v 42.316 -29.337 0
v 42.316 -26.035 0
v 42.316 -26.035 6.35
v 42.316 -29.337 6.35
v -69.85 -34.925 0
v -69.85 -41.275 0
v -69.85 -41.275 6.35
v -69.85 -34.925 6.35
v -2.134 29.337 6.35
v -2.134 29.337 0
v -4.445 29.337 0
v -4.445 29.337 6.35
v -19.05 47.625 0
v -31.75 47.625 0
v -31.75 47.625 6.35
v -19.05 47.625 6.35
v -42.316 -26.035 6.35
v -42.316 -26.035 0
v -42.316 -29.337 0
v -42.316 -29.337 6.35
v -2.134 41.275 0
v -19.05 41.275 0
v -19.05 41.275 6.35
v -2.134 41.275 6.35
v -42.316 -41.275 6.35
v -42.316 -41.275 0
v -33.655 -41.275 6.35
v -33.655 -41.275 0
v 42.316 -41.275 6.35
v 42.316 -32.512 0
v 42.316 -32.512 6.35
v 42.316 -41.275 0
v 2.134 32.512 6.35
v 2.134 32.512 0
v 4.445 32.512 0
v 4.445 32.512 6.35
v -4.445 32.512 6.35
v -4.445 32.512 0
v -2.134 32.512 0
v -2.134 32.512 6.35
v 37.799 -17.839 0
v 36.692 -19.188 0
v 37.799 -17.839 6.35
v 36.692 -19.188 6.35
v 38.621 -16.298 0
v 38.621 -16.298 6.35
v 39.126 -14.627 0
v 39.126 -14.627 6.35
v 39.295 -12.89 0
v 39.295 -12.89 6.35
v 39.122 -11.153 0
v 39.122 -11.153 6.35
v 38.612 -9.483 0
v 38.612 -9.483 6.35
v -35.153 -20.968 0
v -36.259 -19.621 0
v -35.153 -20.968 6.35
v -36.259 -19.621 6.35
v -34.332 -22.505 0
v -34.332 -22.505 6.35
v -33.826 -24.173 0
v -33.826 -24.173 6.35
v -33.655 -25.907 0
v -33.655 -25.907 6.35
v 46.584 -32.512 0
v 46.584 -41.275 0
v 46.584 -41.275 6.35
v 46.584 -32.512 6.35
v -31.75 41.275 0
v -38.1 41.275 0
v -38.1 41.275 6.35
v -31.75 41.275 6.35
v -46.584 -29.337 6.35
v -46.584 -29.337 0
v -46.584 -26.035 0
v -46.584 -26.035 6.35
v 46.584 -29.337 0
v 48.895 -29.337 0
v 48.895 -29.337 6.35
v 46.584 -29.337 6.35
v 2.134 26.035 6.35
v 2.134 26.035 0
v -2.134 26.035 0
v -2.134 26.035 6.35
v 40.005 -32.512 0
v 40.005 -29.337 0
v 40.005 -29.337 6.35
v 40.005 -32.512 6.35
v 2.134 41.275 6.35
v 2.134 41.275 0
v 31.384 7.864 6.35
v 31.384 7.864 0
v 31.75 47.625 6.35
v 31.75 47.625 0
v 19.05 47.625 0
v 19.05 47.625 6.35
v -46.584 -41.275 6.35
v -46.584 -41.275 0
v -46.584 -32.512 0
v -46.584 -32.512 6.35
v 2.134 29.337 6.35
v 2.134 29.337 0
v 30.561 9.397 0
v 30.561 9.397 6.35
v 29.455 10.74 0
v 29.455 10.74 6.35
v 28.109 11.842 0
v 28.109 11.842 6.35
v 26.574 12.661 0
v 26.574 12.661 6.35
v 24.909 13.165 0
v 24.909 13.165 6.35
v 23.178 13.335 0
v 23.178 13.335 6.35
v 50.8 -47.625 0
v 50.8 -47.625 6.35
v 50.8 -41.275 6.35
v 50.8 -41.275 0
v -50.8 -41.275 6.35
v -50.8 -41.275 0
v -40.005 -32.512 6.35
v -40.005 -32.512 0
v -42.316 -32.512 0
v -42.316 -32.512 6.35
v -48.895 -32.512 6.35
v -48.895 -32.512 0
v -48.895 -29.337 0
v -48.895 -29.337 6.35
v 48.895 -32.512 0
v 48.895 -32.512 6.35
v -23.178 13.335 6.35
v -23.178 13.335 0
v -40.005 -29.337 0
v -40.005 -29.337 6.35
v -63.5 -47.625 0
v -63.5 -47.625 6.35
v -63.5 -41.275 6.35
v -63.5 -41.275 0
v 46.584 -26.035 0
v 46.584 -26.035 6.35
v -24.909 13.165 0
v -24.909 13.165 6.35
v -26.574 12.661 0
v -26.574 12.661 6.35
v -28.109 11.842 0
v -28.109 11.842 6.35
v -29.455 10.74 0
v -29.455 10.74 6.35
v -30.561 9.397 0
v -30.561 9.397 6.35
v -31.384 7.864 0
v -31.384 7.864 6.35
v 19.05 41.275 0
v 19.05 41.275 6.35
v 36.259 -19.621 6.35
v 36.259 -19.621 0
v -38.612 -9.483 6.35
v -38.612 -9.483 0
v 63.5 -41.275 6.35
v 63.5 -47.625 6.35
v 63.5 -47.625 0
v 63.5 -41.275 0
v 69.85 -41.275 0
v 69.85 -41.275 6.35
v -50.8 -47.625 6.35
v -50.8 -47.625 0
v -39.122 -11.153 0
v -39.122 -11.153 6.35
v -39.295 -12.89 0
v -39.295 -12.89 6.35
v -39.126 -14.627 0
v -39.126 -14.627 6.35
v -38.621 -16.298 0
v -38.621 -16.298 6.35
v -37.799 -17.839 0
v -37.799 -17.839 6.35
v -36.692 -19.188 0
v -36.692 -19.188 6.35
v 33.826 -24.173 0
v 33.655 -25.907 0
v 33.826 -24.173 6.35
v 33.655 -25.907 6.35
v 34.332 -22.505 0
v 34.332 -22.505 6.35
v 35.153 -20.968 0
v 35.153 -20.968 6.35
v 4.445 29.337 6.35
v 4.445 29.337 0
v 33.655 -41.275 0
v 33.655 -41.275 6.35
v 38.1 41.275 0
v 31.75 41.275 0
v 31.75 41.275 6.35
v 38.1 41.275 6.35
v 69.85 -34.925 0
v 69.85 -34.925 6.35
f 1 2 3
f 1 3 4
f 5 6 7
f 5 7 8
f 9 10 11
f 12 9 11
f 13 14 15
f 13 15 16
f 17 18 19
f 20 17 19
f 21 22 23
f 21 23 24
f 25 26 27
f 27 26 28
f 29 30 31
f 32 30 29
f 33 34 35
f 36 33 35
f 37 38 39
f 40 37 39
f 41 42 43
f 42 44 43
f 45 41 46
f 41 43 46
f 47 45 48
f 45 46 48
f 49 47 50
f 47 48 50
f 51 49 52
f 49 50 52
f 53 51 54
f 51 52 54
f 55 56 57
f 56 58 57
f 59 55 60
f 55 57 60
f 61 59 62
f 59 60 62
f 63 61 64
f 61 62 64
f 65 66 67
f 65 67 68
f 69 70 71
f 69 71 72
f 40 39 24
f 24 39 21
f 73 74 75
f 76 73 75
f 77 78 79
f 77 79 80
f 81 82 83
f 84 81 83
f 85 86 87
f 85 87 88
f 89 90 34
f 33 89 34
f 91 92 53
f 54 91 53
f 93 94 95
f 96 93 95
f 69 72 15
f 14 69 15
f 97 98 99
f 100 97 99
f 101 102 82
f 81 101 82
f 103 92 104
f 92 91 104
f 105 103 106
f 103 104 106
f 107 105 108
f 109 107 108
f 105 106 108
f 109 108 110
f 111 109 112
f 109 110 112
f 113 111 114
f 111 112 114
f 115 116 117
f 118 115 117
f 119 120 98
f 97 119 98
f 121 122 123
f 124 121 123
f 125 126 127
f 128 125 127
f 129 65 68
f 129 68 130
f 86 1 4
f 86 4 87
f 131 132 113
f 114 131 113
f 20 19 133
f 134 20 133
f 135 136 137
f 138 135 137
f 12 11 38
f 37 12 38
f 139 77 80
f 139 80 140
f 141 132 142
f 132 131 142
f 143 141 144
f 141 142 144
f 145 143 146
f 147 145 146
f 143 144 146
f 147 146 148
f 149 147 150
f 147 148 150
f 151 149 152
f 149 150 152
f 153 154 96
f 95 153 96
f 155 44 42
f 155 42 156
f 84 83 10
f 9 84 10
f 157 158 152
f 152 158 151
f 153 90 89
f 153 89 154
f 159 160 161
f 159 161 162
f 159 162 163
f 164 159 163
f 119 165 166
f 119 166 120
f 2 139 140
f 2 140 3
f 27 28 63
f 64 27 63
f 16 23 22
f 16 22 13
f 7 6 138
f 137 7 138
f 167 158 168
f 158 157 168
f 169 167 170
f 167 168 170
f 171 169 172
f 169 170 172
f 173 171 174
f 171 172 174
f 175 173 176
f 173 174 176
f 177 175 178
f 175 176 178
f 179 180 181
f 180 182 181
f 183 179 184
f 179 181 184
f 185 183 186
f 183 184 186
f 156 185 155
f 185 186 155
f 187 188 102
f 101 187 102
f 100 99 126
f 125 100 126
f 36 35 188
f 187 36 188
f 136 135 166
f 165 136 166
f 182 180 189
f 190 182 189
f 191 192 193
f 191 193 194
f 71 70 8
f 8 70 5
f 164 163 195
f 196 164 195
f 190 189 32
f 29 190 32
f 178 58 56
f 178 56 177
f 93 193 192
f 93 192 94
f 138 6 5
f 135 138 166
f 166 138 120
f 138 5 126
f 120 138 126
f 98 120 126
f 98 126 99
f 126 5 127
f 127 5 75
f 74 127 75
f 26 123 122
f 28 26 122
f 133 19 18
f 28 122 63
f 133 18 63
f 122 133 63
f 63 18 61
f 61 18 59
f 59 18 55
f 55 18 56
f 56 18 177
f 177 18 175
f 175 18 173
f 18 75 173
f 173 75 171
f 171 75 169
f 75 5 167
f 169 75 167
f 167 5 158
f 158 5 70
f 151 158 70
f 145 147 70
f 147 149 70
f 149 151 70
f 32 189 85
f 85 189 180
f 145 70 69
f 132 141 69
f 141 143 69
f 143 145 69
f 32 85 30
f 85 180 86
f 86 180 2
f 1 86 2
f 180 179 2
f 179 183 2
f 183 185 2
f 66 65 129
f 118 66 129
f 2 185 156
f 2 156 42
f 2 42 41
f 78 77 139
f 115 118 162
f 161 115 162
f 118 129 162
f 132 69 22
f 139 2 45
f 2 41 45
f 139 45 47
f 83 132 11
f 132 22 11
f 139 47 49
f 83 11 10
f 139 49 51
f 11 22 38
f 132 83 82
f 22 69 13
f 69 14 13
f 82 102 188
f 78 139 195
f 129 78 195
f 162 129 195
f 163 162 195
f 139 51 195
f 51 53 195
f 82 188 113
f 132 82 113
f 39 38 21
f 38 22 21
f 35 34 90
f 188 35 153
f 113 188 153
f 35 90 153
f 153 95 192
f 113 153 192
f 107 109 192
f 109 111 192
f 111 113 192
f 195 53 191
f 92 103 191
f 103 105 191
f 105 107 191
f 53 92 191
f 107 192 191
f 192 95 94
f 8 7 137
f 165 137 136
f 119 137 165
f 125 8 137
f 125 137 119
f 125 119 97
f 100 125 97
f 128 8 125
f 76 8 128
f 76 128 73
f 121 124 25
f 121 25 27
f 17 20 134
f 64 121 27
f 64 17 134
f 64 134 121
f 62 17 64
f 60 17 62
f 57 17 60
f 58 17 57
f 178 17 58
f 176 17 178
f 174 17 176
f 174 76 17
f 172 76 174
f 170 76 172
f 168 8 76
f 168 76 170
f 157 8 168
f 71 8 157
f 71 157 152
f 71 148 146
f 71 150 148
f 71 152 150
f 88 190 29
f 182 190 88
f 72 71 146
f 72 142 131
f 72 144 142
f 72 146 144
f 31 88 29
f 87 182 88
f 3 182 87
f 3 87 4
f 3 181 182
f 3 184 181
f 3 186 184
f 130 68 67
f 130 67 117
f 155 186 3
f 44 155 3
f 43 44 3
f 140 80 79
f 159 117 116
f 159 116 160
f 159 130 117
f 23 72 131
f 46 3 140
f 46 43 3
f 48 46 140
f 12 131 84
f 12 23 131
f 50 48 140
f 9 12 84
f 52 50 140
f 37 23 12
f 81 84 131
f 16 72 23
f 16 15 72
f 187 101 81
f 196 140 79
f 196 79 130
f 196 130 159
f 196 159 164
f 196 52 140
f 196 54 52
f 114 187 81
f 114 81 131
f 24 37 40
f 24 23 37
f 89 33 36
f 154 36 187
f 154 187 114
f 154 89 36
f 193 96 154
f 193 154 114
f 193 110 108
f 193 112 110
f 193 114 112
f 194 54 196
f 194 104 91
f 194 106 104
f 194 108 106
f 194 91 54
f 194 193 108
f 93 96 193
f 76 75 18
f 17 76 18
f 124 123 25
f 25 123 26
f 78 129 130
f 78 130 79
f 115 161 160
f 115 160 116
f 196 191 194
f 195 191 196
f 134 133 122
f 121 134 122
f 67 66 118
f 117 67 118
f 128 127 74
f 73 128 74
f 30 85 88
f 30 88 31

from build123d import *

# Parameters (mm, degrees)
SKETCH1_W               = 139.7
SKETCH1_H               = 82.55
BOSS_EXTRUDE1_DEPTH     = 6.35
SKETCH2_W               = 12.7
SKETCH2_H               = 6.35
BOSS_EXTRUDE2_DEPTH     = 6.35
CUT_EXTRUDE1_DEPTH      = 6.35
CUT_EXTRUDE8_DEPTH      = 6.35
CUT_EXTRUDE2_DEPTH      = 6.35
CUT_EXTRUDE9_DEPTH      = 85.77904001
CUT_EXTRUDE9_DEPTH_BACK = 85.77904001
FILLET1_R               = 8.89


with BuildPart() as part:
    # Sketch1 → Boss-Extrude1 (new body)
    with BuildSketch(Plane.XY):
        Rectangle(SKETCH1_W, SKETCH1_H)
    extrude(amount=BOSS_EXTRUDE1_DEPTH)

    # Sketch2 → Boss-Extrude2 (add)
    with BuildSketch(Plane(origin=(0, 0, 0), x_dir=(-1, 0, 0), z_dir=(0, 0, -1))):
        with Locations((-57.15, -44.45)):
            Rectangle(SKETCH2_W, SKETCH2_H)
        with Locations((-25.4, 44.45)):
            Rectangle(SKETCH2_W, SKETCH2_H)
    boss_extrude2 = extrude(amount=-BOSS_EXTRUDE2_DEPTH)

    # Sketch3 → Cut-Extrude1 (cut)
    with BuildSketch(Plane(origin=(0, 0, 0), x_dir=(-1, 0, 0), z_dir=(0, 0, -1))):
        Polygon((-46.5836, -41.275), (-46.5836, -32.512), (-48.895, -32.512), (-48.895, -29.337), (-46.5836, -29.337), (-46.5836, -26.035), (-42.3164, -26.035), (-42.3164, -29.337), (-40.005, -29.337), (-40.005, -32.512), (-42.3164, -32.512), (-42.3164, -41.275), align=None)
    cut_extrude1 = extrude(amount=-CUT_EXTRUDE1_DEPTH, mode=Mode.SUBTRACT)

    # Sketch7 → Cut-Extrude8 (cut)
    with BuildSketch(Plane(origin=(0, 0, 0), x_dir=(-1, 0, 0), z_dir=(0, 0, -1))):
        Polygon((-38.1, 41.275), (-69.85, -34.925), (-69.85, 41.275), align=None)
    cut_extrude8 = extrude(amount=-CUT_EXTRUDE8_DEPTH, mode=Mode.SUBTRACT)

    # Mirror2: Boss-Extrude2, Cut-Extrude8 across plane
    add(boss_extrude2.mirror(Plane(origin=(0, 0, 0), x_dir=(0, 0, 1), z_dir=(1, 0, 0))))
    add(cut_extrude8.mirror(Plane(origin=(0, 0, 0), x_dir=(0, 0, 1), z_dir=(1, 0, 0))), mode=Mode.SUBTRACT)

    # Mirror4: Cut-Extrude1 across plane
    add(cut_extrude1.mirror(Plane(origin=(0, 0, 0), x_dir=(0, 0, 1), z_dir=(1, 0, 0))), mode=Mode.SUBTRACT)

    # Sketch4 → Cut-Extrude2 (cut)
    with BuildSketch(Plane(origin=(0, 0, 0), x_dir=(-1, 0, 0), z_dir=(0, 0, -1))):
        Polygon((2.1336, 41.275), (-2.1336, 41.275), (-2.1336, 32.512), (-4.445, 32.512), (-4.445, 29.337), (-2.1336, 29.337), (-2.1336, 26.035), (2.1336, 26.035), (2.1336, 29.337), (4.445, 29.337), (4.445, 32.512), (2.1336, 32.512), align=None)
    extrude(amount=-CUT_EXTRUDE2_DEPTH, mode=Mode.SUBTRACT)

    # Sketch8 → Cut-Extrude9 (cut, two sides: drawn at the far end of the back side and taken through both)
    with BuildSketch(Plane.XY.offset(6.35).offset(-CUT_EXTRUDE9_DEPTH_BACK)):
        Polygon((-33.655, -22.225), (-40.901470588, -14.978529412), (-29.104166667, 13.335), (29.104166667, 13.335), (40.901470588, -14.978529412), (33.655, -22.225), (33.655, -41.275), (-33.655, -41.275), align=None)
    extrude(amount=CUT_EXTRUDE9_DEPTH + CUT_EXTRUDE9_DEPTH_BACK, mode=Mode.SUBTRACT)

    # Fillet1
    fillet1_edges = [part.edges().sort_by_distance(p)[0] for p in [
        (-33.655, -22.225, 3.175),
        (-40.901470588, -14.978529412, 3.175),
        (-29.104166667, 13.335, 3.175),
        (29.104166667, 13.335, 3.175),
        (40.901470588, -14.978529412, 3.175),
        (33.655, -22.225, 3.175),
    ]]
    fillet(fillet1_edges, radius=FILLET1_R)


solid = part.part
